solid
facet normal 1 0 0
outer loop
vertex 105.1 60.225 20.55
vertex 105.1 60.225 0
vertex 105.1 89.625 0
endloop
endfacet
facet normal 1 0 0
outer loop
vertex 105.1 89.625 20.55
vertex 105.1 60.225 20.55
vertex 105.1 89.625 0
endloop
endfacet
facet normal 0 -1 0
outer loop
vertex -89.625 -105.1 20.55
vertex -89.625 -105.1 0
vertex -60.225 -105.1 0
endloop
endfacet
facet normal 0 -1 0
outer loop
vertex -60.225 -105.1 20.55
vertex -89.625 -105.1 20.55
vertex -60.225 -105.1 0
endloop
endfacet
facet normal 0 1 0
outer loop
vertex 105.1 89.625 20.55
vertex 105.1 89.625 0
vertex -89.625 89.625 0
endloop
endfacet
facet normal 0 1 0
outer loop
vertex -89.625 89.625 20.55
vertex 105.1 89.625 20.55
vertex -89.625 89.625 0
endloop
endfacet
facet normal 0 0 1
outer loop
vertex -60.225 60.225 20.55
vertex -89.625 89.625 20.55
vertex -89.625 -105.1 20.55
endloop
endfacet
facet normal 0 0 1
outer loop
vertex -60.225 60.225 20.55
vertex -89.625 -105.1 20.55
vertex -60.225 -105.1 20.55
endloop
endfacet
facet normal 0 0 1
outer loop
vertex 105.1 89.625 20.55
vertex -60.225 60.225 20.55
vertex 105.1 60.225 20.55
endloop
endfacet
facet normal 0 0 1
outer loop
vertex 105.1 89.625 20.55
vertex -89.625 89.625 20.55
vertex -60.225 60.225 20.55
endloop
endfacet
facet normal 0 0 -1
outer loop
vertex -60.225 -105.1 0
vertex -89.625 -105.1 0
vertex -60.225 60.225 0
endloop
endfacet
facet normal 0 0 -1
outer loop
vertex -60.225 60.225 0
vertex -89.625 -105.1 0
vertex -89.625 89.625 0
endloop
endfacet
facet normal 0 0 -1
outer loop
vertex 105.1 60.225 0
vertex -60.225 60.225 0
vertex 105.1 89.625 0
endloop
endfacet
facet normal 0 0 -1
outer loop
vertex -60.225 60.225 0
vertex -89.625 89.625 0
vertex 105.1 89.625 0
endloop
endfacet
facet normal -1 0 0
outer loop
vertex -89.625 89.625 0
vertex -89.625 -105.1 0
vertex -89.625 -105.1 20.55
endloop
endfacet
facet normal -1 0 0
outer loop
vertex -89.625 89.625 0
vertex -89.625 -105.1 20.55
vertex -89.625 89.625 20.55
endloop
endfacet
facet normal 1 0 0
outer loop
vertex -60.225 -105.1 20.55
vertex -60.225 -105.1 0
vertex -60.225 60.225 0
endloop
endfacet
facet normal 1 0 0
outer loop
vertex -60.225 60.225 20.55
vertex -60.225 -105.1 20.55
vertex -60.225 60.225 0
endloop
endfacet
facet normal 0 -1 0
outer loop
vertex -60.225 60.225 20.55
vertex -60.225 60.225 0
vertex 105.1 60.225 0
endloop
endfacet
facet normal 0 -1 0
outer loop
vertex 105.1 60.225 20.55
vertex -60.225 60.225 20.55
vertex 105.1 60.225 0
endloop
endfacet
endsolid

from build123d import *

# Parameters (mm, degrees)
F1_DEPTH = 20.55
F2_W     = 14.525
F2_H     = 29.4
F2_W_2   = 29.4
F2_H_2   = 14.525
F3_DEPTH = 20.551
F4_W     = 29.4
F4_H     = 30
F4_W_2   = 30
F4_H_2   = 29.4
F5_DEPTH = 20.55


with BuildPart() as f1:
    # F0 (on Top) → F1 (new body)
    with BuildSketch(Plane.XY):
        Polygon((-60.225, 60.225), (89.625, 60.225), (89.625, 89.625), (-89.625, 89.625), (-89.625, -89.625), (-60.225, -89.625), align=None)
    extrude(amount=F1_DEPTH)

    # F2 (on face) → F3 (cut, through all)
    with BuildSketch(Plane.XY.offset(20.55)):
        with Locations((82.3625, 74.925)):
            Rectangle(F2_W, F2_H)
        with Locations((-74.925, -82.3625)):
            Rectangle(F2_W_2, F2_H_2)
    extrude(amount=-F3_DEPTH, mode=Mode.SUBTRACT)

    # F4 (on Top) → F5 (join, through all)
    with BuildSketch(Plane.XY):
        with Locations((-74.925, -90.1)):
            Rectangle(F4_W, F4_H)
        with Locations((90.1, 74.925)):
            Rectangle(F4_W_2, F4_H_2)
    extrude(amount=F5_DEPTH)


solid = f1.part
